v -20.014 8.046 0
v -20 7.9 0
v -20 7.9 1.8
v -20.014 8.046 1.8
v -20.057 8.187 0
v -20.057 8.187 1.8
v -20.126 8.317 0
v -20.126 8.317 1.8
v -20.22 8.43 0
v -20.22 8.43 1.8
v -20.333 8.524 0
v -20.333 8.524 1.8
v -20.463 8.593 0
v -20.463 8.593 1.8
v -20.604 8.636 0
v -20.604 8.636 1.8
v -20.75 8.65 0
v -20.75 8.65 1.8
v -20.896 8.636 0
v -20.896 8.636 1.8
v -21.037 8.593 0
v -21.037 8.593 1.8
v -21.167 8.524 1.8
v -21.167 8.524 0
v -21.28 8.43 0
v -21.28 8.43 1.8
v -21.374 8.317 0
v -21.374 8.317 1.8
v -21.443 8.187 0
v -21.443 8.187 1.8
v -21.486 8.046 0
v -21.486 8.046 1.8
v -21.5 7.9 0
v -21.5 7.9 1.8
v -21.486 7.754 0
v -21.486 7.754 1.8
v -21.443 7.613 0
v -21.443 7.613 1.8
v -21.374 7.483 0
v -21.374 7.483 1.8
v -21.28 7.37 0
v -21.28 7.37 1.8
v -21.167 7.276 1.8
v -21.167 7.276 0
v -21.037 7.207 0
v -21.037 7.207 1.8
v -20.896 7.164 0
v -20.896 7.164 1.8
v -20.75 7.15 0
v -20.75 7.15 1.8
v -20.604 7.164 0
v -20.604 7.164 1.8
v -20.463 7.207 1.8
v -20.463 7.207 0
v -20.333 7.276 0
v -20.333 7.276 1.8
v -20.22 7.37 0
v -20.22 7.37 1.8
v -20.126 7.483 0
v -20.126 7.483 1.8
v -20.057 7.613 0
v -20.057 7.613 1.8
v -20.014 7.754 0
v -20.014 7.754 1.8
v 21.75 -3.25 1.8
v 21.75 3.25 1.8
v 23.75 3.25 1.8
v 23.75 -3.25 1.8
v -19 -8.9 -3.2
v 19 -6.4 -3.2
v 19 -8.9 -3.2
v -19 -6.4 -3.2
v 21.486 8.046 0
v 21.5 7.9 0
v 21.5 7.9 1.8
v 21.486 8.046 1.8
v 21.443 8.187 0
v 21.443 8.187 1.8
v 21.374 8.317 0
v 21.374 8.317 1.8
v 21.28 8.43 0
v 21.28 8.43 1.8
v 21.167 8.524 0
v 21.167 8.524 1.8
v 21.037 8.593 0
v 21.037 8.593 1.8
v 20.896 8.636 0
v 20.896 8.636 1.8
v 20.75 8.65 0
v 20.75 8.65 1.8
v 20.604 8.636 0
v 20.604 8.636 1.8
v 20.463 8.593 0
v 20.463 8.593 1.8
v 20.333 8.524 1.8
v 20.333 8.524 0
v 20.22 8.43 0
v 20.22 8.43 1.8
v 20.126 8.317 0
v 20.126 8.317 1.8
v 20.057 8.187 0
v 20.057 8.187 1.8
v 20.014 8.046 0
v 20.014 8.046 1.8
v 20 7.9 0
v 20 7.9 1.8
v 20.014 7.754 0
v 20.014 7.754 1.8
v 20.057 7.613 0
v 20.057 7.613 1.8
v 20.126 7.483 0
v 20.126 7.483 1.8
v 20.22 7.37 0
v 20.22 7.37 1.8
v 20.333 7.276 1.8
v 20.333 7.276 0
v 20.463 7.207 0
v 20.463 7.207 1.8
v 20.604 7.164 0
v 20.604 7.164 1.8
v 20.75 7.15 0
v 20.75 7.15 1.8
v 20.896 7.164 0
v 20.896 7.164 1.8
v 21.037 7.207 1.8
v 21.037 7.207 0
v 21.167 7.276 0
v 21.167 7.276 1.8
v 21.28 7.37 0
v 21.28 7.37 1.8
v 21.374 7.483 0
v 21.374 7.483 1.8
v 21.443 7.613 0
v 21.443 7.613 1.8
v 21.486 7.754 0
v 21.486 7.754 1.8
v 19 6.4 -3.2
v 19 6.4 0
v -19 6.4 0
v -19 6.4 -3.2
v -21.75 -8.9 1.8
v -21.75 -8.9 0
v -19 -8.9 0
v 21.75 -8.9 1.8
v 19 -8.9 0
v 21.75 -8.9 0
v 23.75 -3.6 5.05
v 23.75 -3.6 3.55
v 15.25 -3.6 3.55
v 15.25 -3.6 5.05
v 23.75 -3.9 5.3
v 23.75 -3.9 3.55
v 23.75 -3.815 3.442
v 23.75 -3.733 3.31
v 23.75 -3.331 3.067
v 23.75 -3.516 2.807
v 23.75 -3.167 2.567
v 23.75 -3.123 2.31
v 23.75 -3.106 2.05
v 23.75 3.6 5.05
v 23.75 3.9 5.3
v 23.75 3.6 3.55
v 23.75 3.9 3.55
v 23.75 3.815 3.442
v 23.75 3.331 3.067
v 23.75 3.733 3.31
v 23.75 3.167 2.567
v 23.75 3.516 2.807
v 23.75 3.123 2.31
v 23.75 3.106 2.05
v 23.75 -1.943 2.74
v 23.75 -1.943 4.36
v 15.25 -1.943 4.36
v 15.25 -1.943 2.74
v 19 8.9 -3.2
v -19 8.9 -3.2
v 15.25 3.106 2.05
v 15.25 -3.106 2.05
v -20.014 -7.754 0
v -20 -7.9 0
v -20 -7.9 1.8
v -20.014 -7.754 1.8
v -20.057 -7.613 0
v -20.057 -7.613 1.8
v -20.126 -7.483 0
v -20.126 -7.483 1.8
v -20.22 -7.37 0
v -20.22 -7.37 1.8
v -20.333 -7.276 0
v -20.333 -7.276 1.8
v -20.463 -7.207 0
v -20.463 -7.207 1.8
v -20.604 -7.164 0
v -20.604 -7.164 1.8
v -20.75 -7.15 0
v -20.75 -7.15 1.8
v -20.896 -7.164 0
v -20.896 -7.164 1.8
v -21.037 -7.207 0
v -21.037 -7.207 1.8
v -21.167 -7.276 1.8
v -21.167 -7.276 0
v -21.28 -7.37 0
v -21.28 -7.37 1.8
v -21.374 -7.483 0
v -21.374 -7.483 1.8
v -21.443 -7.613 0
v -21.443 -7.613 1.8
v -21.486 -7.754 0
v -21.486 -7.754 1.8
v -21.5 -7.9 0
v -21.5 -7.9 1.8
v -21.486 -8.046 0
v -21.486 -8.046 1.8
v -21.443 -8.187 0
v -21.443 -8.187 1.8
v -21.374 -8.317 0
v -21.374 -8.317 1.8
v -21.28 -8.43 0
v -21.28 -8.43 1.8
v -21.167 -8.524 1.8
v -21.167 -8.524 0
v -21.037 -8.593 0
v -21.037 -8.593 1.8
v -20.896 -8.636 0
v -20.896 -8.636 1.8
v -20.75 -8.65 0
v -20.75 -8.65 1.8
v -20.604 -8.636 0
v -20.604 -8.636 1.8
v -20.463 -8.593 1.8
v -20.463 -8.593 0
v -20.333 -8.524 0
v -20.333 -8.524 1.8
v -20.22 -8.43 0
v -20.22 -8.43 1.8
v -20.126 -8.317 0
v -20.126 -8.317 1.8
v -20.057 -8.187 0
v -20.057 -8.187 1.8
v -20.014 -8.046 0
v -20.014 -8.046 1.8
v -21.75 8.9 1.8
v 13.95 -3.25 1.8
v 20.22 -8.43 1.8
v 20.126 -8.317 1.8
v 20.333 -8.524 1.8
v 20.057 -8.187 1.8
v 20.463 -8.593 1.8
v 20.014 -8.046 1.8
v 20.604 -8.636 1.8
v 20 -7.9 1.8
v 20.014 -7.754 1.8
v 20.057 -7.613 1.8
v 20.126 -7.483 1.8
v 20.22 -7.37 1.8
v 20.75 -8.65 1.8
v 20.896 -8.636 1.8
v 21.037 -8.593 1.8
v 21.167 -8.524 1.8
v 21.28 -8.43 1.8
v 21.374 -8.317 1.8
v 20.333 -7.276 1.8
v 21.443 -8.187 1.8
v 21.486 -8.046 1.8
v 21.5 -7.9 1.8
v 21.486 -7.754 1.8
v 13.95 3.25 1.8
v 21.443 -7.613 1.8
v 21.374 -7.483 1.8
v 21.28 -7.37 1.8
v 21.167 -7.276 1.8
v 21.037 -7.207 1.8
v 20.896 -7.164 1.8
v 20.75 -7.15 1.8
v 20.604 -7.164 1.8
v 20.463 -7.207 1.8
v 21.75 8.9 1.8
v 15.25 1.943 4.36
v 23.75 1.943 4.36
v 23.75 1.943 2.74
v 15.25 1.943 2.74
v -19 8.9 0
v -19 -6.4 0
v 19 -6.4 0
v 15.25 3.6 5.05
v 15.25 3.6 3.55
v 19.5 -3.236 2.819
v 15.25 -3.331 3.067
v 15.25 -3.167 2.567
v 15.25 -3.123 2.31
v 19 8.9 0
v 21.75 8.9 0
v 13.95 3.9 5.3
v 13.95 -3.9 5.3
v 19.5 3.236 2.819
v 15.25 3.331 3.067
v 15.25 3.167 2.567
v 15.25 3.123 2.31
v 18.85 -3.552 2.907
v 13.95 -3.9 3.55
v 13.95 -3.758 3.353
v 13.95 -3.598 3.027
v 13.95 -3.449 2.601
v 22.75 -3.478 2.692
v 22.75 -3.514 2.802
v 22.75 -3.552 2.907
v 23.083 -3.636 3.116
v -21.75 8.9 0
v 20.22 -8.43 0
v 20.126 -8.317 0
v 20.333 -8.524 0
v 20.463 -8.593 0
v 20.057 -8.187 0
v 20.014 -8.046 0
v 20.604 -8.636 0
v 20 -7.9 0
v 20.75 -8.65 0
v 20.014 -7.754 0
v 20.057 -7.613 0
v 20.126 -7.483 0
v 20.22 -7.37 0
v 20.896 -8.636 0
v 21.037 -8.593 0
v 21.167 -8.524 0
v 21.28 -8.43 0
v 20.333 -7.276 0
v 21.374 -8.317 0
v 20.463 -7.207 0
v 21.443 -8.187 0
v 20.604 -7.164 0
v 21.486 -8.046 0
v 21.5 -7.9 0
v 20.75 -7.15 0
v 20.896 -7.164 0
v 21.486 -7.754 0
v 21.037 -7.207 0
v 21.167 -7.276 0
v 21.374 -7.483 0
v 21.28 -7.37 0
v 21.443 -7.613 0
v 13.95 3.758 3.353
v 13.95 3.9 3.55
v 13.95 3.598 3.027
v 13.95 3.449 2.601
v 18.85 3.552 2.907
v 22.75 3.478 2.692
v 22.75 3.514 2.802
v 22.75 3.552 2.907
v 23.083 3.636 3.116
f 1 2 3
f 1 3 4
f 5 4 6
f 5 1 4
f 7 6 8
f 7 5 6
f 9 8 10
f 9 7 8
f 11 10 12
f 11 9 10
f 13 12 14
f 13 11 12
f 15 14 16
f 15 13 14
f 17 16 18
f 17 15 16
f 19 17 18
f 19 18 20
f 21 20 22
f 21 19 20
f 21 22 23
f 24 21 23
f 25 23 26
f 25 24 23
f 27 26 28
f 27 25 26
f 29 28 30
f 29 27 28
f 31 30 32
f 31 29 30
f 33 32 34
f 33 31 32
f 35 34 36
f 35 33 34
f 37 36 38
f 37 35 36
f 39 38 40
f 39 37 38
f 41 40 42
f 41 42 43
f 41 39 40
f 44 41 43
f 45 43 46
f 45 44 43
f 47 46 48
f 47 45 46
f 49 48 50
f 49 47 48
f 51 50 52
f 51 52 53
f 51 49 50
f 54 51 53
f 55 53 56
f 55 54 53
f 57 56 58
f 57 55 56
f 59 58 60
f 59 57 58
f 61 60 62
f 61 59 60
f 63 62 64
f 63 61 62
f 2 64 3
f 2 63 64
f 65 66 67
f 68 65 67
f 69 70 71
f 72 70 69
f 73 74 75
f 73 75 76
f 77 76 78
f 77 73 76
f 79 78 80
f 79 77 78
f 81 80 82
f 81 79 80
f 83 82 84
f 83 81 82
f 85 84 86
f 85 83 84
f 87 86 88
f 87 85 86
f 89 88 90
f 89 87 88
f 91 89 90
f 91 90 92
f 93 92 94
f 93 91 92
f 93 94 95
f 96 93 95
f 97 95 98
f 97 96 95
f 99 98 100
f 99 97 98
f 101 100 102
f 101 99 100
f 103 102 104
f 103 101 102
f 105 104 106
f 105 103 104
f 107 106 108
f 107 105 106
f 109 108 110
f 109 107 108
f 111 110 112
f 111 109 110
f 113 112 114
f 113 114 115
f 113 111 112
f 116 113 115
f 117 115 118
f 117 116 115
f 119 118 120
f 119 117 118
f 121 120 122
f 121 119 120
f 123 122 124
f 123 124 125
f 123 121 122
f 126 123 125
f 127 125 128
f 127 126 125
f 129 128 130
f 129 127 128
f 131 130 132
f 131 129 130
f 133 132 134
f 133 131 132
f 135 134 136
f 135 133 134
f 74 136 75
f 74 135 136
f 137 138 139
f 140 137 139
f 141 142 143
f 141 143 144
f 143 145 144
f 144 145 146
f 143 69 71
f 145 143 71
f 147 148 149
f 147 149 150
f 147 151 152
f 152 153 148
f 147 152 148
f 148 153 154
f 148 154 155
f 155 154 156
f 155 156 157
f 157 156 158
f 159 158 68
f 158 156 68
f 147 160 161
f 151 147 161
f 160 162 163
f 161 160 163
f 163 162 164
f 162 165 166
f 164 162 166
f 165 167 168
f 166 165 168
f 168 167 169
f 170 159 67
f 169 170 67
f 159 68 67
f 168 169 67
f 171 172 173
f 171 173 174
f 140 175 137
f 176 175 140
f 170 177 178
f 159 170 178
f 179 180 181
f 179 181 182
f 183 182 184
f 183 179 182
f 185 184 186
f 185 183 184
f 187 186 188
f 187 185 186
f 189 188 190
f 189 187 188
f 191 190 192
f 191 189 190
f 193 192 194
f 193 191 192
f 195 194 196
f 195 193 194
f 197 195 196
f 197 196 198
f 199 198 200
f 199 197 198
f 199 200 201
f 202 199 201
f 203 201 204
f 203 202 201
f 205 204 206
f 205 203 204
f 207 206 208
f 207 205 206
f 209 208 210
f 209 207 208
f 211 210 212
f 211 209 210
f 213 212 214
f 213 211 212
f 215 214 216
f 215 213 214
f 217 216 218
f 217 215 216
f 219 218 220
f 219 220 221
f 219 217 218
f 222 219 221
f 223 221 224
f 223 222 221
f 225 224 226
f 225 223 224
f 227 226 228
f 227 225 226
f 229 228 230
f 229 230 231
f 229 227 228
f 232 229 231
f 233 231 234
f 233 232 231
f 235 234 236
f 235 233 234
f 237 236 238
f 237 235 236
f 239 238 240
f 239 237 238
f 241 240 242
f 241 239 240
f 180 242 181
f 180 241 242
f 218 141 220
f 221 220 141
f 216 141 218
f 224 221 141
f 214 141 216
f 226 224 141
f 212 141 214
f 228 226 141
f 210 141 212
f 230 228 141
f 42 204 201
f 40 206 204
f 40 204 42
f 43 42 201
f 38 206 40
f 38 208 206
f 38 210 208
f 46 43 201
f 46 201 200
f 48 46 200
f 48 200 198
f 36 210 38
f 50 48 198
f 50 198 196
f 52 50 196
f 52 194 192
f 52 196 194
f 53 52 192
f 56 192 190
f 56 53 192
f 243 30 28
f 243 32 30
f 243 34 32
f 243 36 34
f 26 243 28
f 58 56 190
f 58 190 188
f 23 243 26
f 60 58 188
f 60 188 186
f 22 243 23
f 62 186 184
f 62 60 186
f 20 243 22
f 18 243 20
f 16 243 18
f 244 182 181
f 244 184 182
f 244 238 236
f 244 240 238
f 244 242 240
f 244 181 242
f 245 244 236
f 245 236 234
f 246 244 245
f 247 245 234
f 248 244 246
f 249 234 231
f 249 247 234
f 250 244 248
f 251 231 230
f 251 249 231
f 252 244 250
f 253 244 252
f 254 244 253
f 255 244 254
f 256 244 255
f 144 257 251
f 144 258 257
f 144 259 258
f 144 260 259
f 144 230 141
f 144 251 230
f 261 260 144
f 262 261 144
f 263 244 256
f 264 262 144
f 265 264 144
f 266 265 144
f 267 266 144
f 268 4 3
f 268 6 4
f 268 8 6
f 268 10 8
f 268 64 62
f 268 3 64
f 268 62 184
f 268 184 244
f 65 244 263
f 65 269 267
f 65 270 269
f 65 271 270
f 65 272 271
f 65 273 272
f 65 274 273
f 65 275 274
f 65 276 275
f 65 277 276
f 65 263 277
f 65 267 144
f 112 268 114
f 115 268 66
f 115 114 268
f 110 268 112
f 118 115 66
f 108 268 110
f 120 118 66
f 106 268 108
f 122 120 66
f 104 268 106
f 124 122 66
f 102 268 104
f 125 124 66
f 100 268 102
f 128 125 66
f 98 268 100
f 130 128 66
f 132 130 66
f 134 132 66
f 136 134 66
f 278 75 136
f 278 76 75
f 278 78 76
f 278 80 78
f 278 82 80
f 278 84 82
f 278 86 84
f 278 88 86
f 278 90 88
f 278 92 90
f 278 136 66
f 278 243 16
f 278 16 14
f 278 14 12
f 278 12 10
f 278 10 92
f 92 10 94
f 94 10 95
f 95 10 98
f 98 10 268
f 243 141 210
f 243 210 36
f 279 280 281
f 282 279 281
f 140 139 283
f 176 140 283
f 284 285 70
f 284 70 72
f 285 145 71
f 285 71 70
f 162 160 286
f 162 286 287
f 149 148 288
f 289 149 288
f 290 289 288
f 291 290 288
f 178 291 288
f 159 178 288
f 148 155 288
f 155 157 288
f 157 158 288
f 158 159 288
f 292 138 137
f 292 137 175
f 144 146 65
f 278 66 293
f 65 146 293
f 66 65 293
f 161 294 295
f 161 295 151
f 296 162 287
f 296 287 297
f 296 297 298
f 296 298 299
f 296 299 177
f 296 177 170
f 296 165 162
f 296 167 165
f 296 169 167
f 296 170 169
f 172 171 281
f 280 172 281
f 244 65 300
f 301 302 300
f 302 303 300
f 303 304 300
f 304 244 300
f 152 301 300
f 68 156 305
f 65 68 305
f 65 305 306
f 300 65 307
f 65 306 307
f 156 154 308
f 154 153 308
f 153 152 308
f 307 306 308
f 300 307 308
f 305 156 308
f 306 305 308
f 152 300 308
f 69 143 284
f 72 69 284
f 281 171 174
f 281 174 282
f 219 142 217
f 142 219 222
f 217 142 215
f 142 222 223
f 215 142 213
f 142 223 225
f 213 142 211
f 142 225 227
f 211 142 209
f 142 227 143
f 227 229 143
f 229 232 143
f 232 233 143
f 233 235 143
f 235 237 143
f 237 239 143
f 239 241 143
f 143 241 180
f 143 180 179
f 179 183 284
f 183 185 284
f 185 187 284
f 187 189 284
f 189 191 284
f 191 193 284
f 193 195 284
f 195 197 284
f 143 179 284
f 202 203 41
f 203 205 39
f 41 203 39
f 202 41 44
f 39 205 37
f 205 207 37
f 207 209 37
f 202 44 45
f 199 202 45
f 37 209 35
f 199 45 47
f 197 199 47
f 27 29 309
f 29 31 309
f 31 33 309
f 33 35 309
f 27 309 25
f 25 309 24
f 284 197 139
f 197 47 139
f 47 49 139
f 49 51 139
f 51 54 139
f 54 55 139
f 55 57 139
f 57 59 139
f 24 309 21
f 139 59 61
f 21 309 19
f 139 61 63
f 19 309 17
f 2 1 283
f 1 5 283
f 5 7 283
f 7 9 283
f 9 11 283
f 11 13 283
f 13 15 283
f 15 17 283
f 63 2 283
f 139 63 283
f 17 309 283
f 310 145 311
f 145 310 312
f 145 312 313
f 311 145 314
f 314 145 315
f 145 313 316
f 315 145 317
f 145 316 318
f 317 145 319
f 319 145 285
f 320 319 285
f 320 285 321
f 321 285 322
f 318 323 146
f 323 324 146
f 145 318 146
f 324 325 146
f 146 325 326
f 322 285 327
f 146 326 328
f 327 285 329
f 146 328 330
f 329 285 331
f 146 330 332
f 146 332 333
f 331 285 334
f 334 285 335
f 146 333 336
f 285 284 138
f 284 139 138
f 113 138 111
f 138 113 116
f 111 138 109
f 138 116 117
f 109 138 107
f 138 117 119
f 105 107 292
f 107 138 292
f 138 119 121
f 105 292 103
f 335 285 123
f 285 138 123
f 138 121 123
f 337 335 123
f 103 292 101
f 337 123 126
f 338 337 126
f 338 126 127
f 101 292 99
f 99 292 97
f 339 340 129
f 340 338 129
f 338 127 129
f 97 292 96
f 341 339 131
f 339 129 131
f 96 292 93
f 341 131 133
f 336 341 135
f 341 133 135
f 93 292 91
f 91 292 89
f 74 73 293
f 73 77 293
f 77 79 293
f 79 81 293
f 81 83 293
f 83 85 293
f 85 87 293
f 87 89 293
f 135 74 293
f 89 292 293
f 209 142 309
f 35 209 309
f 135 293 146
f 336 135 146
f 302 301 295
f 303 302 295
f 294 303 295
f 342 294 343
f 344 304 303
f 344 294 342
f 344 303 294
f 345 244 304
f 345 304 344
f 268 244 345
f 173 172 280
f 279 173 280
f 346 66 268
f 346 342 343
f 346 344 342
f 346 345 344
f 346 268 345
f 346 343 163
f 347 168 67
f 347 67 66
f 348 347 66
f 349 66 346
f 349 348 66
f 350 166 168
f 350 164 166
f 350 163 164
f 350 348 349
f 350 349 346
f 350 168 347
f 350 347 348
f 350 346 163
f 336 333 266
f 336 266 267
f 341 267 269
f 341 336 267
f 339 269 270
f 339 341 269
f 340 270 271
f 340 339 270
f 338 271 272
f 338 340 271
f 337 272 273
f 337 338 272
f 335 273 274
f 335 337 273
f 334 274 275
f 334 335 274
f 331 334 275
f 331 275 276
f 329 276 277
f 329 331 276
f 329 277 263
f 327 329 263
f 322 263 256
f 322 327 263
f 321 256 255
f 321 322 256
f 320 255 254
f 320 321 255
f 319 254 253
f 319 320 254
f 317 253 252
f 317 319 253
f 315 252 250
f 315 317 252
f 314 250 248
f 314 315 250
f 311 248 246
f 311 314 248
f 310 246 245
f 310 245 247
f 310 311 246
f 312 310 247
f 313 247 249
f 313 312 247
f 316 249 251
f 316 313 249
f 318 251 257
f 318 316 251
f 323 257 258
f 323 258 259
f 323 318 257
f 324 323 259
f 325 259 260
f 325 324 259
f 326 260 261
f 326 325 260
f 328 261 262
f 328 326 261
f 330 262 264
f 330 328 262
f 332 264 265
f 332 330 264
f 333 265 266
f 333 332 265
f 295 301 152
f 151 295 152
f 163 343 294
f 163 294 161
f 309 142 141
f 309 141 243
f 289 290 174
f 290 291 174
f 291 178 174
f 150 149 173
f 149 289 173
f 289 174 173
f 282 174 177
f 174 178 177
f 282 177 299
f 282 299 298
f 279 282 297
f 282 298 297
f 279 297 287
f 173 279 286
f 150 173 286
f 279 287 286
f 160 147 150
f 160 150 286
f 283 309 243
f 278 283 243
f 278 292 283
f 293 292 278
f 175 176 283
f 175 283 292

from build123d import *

# Parameters (mm, degrees)
SKETCH1_W           = 43.5
SKETCH1_H           = 17.8
SKETCH1_R           = 0.75
BOSS_EXTRUDE1_DEPTH = 1.8
SKETCH2_W           = 9.8
SKETCH2_H           = 7.8
BOSS_EXTRUDE2_DEPTH = 3.5
CUT_EXTRUDE1_DEPTH  = 46.5
SKETCH4_W           = 1.61922946
SKETCH4_H           = 3.886150706
CUT_EXTRUDE2_DEPTH  = 8.5
SKETCH5_W           = 38
SKETCH5_H           = 2.5
BOSS_EXTRUDE3_DEPTH = 3.2


with BuildPart() as part:
    # Sketch1 → Boss-Extrude1 (new body)
    with BuildSketch(Plane.XY):
        Rectangle(SKETCH1_W, SKETCH1_H)
        with Locations((20.75, 7.9)):
            Circle(SKETCH1_R, mode=Mode.SUBTRACT)
        with Locations((-20.75, 7.9)):
            Circle(SKETCH1_R, mode=Mode.SUBTRACT)
        with Locations((20.75, -7.9)):
            Circle(SKETCH1_R, mode=Mode.SUBTRACT)
        with Locations((-20.75, -7.9)):
            Circle(SKETCH1_R, mode=Mode.SUBTRACT)
    extrude(amount=BOSS_EXTRUDE1_DEPTH)

    # Sketch2 → Boss-Extrude2 (add)
    with BuildSketch(Plane.XY.offset(1.8)):
        with Locations((18.85, 0)):
            Rectangle(SKETCH2_W, SKETCH2_H)
    extrude(amount=BOSS_EXTRUDE2_DEPTH)

    # Sketch3 → Cut-Extrude1 (cut, through all)
    with BuildSketch(Plane(origin=(23.75, 0, 0), x_dir=(0, 0, -1), z_dir=(1, 0, 0))):
        with BuildLine():
            Line((-3.55, 3.9), (-1.8, 3.9))
            Line((-1.8, 3.9), (-1.8, 3.25))
            add(Edge.make_bspline(
                [(-1.8, 3.25), (-3.138543339, 3.528152874), (-3.55, 3.9)],
                knots=[0, 0, 0, 0.396074417, 0.396074417, 0.396074417], degree=2))
        make_face()
        with BuildLine():
            Line((-3.55, -3.9), (-1.8, -3.9))
            Line((-1.8, -3.9), (-1.8, -3.25))
            add(Edge.make_bspline(
                [(-1.8, -3.25), (-3.138543339, -3.528152874), (-3.55, -3.9)],
                knots=[0, 0, 0, 0.396074417, 0.396074417, 0.396074417], degree=2))
        make_face()
    extrude(amount=-CUT_EXTRUDE1_DEPTH, mode=Mode.SUBTRACT)

    # Sketch4 → Cut-Extrude2 (cut)
    with BuildSketch(Plane(origin=(23.75, 0, 0), x_dir=(0, 0, -1), z_dir=(1, 0, 0))):
        with BuildLine():
            Line((-3.55, -3.6), (-5.05, -3.6))
            Line((-5.05, -3.6), (-5.05, 3.6))
            Line((-5.05, 3.6), (-3.55, 3.6))
            add(Edge.make_bspline(
                [(-3.55, 3.6), (-2.837497732, 3.119257632), (-2.05, 3.105849487)],
                knots=[0, 0, 0, 0.945732544, 0.945732544, 0.945732544], degree=2))
            Line((-2.05, 3.105849487), (-2.05, -3.105849487))
            add(Edge.make_bspline(
                [(-3.55, -3.6), (-2.837497732, -3.119257632), (-2.05, -3.105849487)],
                knots=[0, 0, 0, 0.945732544, 0.945732544, 0.945732544], degree=2))
        make_face()
        with Locations((-3.55, 0)):
            Rectangle(SKETCH4_W, SKETCH4_H, mode=Mode.SUBTRACT)
    extrude(amount=-CUT_EXTRUDE2_DEPTH, mode=Mode.SUBTRACT)

    # Sketch5 → Boss-Extrude3 (add)
    with BuildSketch(Plane(origin=(0, 0, 0), x_dir=(-1, 0, 0), z_dir=(0, 0, -1))):
        with Locations((0, 7.65)):
            Rectangle(SKETCH5_W, SKETCH5_H)
        with Locations((0, -7.65)):
            Rectangle(SKETCH5_W, SKETCH5_H)
    extrude(amount=BOSS_EXTRUDE3_DEPTH)


solid = part.part
